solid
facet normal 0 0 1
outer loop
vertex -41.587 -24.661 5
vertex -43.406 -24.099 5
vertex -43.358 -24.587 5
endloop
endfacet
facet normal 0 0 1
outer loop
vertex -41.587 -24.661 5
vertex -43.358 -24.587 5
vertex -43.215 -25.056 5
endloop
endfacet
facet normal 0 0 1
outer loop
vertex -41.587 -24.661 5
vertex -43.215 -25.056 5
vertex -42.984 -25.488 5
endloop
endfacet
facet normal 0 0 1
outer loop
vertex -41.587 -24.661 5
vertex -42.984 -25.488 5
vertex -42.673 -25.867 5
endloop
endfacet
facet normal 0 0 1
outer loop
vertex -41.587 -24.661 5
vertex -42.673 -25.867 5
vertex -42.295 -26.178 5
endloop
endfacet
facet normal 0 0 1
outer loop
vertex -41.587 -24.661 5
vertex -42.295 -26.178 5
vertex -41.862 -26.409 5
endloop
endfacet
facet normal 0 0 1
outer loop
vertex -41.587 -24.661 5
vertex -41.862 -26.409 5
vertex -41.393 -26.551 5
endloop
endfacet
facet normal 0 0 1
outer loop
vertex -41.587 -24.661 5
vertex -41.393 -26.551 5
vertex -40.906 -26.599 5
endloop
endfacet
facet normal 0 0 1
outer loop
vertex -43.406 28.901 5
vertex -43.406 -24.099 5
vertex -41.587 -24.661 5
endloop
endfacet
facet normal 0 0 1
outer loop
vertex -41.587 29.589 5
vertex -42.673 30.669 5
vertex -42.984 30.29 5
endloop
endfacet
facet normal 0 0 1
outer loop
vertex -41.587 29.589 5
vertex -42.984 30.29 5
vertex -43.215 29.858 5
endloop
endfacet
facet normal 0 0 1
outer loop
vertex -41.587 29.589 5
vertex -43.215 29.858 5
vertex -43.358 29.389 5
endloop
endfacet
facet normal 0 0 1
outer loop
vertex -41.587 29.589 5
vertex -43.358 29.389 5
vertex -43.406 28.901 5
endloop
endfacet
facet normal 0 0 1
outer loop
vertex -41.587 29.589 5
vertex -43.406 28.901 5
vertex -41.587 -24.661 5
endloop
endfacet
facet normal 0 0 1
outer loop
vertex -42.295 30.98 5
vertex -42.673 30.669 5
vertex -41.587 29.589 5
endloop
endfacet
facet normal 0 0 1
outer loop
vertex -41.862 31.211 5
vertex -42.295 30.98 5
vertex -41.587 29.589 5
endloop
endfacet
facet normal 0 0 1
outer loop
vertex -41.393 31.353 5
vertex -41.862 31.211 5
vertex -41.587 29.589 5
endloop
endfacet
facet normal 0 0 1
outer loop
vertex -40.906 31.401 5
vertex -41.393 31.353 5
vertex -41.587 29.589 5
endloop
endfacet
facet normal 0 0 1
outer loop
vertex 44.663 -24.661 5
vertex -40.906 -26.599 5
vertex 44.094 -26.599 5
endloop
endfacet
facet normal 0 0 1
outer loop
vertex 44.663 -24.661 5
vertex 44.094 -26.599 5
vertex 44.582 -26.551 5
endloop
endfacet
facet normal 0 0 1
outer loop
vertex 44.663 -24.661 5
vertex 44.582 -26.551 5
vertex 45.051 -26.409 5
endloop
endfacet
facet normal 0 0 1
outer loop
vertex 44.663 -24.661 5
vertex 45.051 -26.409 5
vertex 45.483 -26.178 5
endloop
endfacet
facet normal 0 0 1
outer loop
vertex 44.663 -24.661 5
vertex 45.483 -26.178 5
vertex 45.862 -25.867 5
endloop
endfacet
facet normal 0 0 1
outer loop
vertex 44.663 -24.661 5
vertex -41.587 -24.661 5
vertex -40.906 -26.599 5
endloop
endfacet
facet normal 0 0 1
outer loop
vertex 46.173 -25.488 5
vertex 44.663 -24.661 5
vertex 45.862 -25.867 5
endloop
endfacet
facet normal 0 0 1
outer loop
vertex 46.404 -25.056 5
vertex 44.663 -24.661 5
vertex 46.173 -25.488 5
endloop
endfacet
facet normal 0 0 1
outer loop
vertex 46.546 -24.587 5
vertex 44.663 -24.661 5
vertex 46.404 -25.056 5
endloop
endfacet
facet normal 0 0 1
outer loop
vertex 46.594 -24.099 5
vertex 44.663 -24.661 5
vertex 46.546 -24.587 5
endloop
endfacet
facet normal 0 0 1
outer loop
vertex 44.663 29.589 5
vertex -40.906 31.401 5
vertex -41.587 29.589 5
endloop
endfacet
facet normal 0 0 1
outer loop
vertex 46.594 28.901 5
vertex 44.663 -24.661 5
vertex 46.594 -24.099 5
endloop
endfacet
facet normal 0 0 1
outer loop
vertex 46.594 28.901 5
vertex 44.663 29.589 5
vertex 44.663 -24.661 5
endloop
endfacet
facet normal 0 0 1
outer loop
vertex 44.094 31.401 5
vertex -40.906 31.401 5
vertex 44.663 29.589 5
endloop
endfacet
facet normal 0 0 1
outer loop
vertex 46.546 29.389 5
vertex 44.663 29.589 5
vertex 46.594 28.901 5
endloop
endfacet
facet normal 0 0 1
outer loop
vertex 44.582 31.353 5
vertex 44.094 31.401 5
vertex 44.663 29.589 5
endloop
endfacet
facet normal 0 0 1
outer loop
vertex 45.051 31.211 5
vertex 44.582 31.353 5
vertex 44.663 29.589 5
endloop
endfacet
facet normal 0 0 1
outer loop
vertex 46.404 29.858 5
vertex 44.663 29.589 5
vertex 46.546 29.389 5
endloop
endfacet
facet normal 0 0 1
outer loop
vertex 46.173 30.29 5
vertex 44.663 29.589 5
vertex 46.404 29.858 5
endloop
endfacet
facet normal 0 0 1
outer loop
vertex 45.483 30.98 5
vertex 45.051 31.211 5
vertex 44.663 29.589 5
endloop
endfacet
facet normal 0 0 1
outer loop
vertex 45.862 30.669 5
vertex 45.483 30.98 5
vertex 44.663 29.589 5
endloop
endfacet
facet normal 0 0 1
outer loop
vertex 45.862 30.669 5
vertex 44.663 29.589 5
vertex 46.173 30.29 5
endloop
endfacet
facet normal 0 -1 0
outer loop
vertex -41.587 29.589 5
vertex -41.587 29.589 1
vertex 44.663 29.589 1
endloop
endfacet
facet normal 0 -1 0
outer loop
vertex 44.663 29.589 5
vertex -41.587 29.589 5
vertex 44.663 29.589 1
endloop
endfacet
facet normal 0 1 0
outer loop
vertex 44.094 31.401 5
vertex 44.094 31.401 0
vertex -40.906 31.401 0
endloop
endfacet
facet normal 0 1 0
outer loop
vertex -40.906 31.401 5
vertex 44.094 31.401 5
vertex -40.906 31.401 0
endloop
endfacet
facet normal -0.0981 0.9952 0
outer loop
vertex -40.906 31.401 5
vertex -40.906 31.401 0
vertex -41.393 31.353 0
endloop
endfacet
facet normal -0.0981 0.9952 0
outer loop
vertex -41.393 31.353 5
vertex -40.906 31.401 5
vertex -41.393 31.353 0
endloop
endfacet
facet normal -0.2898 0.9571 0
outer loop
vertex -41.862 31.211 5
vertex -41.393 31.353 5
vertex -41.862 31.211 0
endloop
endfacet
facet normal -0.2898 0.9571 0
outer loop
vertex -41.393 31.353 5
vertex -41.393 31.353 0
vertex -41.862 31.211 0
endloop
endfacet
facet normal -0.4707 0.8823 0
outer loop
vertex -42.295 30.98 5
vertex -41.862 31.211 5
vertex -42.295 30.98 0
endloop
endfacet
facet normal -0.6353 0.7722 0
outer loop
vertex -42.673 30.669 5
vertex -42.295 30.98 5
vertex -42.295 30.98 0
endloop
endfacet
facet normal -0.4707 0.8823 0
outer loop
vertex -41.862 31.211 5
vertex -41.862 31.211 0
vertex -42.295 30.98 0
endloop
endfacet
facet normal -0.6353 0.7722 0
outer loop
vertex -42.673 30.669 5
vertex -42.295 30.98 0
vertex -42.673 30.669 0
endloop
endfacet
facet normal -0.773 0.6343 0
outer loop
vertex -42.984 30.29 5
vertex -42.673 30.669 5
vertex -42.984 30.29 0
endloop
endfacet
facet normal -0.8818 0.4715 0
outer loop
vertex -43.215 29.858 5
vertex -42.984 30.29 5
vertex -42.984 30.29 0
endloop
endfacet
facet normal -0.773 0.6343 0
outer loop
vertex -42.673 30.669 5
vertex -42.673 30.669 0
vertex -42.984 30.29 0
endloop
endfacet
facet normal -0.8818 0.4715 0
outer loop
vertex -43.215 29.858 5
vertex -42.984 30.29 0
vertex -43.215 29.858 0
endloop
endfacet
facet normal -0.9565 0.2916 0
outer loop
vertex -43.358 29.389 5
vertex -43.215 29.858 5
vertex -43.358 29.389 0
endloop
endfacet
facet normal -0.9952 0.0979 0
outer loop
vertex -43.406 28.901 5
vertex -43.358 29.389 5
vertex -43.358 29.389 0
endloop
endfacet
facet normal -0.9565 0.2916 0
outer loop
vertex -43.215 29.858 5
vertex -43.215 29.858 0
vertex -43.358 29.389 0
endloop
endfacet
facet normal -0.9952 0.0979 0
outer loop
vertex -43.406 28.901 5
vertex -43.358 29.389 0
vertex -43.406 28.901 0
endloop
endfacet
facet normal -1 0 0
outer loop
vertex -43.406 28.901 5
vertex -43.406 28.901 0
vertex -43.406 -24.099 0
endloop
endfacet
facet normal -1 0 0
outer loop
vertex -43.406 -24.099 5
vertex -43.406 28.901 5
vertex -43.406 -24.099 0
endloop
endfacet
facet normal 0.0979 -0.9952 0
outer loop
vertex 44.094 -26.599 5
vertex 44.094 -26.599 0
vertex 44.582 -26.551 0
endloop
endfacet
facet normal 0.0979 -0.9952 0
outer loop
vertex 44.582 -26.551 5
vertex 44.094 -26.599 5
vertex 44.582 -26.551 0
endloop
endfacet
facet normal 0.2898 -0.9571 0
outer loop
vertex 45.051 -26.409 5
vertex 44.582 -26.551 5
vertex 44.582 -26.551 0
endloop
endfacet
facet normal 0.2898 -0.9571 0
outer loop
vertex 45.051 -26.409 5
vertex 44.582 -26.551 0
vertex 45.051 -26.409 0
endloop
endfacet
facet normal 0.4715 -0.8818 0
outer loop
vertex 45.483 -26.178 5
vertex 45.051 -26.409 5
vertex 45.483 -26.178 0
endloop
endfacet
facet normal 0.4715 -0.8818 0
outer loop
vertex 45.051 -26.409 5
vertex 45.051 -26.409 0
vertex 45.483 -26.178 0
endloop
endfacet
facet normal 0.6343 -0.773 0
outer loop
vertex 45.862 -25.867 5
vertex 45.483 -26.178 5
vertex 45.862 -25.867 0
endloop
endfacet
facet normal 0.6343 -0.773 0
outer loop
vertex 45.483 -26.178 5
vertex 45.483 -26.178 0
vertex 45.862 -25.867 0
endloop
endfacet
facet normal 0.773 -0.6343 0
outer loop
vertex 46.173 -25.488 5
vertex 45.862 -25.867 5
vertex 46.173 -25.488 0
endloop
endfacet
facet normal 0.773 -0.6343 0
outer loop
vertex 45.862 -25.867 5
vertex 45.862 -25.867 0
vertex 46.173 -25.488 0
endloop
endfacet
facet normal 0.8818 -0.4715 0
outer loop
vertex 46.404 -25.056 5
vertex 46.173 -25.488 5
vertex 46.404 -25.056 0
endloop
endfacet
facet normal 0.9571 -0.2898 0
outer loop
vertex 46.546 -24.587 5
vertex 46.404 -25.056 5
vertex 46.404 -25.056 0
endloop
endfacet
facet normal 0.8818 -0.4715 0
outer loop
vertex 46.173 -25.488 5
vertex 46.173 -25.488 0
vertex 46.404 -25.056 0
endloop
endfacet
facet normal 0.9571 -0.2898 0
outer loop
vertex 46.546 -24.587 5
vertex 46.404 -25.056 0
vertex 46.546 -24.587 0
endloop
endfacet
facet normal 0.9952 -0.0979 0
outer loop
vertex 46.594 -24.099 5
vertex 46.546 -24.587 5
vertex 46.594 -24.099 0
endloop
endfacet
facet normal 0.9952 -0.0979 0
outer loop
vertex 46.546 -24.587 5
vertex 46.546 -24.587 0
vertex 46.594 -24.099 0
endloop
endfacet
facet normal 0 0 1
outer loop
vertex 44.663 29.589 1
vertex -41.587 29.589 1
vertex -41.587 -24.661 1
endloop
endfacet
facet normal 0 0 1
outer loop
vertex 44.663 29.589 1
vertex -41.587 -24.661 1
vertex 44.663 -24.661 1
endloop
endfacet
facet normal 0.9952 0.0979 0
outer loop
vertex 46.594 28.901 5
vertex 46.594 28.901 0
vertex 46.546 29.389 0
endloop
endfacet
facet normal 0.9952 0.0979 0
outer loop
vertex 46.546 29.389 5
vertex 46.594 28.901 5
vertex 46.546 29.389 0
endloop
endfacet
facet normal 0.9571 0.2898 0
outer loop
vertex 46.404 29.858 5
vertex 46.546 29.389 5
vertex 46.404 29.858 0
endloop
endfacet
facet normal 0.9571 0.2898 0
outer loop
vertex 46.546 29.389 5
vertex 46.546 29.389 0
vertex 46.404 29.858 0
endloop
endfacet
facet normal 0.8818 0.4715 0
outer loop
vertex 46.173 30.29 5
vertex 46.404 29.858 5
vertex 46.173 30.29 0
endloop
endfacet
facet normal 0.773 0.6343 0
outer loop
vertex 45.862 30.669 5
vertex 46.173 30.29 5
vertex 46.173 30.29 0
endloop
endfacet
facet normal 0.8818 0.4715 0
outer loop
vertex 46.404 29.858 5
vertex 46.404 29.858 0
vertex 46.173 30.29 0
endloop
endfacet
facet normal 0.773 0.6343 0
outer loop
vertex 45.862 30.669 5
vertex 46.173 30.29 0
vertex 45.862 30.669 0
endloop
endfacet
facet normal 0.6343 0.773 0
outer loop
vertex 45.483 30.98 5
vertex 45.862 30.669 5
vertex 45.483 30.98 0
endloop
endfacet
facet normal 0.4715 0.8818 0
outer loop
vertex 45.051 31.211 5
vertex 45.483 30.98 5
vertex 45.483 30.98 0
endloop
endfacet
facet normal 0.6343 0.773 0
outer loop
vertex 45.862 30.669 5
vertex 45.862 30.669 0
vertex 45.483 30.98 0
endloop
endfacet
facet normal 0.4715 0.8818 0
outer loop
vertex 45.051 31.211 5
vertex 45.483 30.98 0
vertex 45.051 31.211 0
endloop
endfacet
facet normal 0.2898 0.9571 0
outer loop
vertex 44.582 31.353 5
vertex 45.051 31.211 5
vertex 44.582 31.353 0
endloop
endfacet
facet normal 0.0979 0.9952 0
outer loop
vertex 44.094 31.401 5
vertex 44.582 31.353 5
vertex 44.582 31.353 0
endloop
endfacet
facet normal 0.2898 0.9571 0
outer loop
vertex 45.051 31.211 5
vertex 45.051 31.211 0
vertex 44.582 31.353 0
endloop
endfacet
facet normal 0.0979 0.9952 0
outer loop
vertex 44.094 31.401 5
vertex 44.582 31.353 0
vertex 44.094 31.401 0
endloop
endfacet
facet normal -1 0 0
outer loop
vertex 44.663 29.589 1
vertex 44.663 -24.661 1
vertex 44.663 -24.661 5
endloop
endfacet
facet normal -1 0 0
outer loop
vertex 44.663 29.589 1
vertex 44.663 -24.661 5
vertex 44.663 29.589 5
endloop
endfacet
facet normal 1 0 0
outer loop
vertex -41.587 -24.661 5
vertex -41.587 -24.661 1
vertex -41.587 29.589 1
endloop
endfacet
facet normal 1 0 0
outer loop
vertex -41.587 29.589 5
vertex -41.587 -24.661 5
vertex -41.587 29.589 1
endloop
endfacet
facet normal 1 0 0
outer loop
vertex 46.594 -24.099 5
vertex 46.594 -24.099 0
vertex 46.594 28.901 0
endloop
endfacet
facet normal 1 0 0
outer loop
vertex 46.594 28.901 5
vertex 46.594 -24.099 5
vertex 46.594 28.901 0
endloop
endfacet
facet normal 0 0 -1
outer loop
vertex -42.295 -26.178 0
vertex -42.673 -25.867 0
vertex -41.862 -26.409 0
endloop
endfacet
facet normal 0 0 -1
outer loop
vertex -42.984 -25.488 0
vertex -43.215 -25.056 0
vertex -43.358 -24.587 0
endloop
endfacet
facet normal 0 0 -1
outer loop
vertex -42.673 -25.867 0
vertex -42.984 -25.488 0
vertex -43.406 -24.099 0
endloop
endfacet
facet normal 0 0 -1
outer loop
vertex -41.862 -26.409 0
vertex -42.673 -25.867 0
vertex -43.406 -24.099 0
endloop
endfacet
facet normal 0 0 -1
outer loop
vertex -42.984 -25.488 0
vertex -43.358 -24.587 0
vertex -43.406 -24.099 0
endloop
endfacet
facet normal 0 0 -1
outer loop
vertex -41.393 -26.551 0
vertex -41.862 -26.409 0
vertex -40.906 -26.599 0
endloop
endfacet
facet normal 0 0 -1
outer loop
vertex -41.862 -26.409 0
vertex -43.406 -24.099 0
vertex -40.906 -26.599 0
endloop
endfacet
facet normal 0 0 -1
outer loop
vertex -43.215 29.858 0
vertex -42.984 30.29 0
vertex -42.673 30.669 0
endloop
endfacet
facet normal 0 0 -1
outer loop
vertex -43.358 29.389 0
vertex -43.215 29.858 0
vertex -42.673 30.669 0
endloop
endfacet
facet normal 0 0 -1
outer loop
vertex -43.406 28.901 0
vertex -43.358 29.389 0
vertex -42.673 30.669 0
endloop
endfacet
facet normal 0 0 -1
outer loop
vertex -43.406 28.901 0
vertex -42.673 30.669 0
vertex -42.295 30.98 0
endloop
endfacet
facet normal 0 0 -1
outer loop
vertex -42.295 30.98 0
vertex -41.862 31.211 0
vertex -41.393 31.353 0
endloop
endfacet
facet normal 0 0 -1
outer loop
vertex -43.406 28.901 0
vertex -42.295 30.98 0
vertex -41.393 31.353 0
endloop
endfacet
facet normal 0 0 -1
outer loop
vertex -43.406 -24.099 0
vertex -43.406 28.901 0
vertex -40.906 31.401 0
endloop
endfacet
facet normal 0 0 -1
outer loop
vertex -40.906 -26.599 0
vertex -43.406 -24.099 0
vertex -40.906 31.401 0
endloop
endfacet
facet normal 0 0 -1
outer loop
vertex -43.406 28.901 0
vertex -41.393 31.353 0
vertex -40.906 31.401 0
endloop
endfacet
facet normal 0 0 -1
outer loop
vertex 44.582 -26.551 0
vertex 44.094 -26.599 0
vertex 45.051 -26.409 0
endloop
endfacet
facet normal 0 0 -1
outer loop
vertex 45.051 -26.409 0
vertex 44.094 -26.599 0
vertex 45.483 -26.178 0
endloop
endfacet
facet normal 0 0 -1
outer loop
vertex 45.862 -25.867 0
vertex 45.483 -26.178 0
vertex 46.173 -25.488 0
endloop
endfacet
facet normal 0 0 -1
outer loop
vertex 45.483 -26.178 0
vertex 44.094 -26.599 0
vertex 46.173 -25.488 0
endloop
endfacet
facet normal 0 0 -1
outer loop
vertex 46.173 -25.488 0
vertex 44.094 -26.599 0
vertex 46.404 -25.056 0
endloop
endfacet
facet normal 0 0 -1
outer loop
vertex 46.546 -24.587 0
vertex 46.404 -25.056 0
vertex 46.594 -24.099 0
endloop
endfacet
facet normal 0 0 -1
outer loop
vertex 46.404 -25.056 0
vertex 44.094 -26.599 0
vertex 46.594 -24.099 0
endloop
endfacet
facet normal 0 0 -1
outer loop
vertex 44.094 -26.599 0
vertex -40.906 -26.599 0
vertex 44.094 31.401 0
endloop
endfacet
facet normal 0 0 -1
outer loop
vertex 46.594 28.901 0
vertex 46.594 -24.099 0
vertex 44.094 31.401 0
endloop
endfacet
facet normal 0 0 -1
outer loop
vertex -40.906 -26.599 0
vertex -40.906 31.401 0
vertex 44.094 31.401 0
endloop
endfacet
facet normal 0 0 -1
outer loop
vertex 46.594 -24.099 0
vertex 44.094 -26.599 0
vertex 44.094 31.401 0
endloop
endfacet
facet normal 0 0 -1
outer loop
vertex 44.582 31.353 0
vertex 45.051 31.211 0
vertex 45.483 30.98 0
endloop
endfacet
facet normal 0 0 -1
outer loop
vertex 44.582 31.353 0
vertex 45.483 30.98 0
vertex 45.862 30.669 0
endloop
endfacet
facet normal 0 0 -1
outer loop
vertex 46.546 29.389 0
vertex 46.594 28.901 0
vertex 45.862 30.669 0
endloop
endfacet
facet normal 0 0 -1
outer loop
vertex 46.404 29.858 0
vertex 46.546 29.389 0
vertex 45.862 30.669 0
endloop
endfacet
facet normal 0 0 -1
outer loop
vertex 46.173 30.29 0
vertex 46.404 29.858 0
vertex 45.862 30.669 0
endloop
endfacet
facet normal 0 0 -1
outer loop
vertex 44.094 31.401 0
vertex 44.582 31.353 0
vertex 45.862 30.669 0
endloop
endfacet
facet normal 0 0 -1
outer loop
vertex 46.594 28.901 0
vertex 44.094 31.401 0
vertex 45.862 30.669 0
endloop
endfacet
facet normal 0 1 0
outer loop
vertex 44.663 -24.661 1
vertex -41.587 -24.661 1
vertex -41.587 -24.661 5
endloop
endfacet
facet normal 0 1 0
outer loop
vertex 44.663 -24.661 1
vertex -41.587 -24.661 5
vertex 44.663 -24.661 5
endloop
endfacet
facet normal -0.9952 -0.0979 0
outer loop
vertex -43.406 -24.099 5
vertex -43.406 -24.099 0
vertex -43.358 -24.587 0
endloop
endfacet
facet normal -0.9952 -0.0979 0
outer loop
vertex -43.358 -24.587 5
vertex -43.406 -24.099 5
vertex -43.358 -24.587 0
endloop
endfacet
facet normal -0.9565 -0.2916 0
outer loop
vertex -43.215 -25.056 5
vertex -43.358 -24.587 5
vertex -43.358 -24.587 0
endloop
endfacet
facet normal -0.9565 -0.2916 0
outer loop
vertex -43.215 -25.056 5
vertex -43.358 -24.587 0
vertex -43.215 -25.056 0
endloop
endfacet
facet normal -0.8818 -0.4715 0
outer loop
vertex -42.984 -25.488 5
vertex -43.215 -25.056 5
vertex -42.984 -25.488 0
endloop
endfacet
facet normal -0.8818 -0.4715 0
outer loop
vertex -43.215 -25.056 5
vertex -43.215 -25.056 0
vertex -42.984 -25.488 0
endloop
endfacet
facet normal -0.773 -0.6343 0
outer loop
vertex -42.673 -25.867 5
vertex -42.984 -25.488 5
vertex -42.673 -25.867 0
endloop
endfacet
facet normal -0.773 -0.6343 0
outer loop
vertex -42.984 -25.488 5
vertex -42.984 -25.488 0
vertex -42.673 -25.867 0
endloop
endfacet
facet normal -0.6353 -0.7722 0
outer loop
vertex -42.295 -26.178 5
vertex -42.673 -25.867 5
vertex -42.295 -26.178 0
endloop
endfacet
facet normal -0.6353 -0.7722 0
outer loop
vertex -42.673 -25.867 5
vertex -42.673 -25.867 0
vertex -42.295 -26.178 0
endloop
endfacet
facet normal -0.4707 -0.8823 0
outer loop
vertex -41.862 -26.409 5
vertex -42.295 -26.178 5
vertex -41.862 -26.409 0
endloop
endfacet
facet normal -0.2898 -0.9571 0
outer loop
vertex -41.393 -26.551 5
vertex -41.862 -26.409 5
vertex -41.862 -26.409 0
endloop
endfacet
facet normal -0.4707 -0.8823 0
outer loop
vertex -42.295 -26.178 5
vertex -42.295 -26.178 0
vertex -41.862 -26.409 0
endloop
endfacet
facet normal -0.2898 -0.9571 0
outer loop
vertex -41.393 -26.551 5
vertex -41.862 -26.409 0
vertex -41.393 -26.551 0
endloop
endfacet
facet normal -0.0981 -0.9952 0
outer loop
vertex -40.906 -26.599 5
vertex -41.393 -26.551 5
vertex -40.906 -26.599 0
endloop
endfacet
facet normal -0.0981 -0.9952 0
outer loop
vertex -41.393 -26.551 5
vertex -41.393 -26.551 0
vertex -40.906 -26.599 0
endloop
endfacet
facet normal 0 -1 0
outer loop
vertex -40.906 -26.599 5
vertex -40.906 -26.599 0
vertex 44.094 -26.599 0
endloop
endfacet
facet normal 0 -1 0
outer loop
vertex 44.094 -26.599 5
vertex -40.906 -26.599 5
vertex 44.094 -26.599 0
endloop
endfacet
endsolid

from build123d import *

# Parameters (mm, degrees)
F0_W     = 86.25
F0_H     = 54.25
F1_DEPTH = 5
F2_DEPTH = 1


with BuildPart() as f1:
    # F0 (on Top) → F1 (new body)
    with BuildSketch(Plane.XY):
        with BuildLine():
            ThreePointArc((-43.405657, -24.099012), (-42.673424, -25.866779), (-40.905657, -26.599012))
            Line((-40.905657, -26.599012), (44.094343, -26.599012))
            ThreePointArc((44.094343, -26.599012), (45.86211, -25.866779), (46.594343, -24.099012))
            Line((46.594343, -24.099012), (46.594343, 28.900988))
            ThreePointArc((46.594343, 28.900988), (45.86211, 30.668755), (44.094343, 31.400988))
            Line((44.094343, 31.400988), (-40.905657, 31.400988))
            ThreePointArc((-40.905657, 31.400988), (-42.673424, 30.668755), (-43.405657, 28.900988))
            Line((-43.405657, 28.900988), (-43.405657, -24.099012))
        make_face()
        with Locations((1.538258, 2.464306)):
            Rectangle(F0_W, F0_H, mode=Mode.SUBTRACT)
    extrude(amount=F1_DEPTH)

    # F0 (on Top) → F2 (join)
    with BuildSketch(Plane.XY):
        with Locations((1.538258, 2.464306)):
            Rectangle(F0_W, F0_H)
    extrude(amount=F2_DEPTH)


solid = f1.part
